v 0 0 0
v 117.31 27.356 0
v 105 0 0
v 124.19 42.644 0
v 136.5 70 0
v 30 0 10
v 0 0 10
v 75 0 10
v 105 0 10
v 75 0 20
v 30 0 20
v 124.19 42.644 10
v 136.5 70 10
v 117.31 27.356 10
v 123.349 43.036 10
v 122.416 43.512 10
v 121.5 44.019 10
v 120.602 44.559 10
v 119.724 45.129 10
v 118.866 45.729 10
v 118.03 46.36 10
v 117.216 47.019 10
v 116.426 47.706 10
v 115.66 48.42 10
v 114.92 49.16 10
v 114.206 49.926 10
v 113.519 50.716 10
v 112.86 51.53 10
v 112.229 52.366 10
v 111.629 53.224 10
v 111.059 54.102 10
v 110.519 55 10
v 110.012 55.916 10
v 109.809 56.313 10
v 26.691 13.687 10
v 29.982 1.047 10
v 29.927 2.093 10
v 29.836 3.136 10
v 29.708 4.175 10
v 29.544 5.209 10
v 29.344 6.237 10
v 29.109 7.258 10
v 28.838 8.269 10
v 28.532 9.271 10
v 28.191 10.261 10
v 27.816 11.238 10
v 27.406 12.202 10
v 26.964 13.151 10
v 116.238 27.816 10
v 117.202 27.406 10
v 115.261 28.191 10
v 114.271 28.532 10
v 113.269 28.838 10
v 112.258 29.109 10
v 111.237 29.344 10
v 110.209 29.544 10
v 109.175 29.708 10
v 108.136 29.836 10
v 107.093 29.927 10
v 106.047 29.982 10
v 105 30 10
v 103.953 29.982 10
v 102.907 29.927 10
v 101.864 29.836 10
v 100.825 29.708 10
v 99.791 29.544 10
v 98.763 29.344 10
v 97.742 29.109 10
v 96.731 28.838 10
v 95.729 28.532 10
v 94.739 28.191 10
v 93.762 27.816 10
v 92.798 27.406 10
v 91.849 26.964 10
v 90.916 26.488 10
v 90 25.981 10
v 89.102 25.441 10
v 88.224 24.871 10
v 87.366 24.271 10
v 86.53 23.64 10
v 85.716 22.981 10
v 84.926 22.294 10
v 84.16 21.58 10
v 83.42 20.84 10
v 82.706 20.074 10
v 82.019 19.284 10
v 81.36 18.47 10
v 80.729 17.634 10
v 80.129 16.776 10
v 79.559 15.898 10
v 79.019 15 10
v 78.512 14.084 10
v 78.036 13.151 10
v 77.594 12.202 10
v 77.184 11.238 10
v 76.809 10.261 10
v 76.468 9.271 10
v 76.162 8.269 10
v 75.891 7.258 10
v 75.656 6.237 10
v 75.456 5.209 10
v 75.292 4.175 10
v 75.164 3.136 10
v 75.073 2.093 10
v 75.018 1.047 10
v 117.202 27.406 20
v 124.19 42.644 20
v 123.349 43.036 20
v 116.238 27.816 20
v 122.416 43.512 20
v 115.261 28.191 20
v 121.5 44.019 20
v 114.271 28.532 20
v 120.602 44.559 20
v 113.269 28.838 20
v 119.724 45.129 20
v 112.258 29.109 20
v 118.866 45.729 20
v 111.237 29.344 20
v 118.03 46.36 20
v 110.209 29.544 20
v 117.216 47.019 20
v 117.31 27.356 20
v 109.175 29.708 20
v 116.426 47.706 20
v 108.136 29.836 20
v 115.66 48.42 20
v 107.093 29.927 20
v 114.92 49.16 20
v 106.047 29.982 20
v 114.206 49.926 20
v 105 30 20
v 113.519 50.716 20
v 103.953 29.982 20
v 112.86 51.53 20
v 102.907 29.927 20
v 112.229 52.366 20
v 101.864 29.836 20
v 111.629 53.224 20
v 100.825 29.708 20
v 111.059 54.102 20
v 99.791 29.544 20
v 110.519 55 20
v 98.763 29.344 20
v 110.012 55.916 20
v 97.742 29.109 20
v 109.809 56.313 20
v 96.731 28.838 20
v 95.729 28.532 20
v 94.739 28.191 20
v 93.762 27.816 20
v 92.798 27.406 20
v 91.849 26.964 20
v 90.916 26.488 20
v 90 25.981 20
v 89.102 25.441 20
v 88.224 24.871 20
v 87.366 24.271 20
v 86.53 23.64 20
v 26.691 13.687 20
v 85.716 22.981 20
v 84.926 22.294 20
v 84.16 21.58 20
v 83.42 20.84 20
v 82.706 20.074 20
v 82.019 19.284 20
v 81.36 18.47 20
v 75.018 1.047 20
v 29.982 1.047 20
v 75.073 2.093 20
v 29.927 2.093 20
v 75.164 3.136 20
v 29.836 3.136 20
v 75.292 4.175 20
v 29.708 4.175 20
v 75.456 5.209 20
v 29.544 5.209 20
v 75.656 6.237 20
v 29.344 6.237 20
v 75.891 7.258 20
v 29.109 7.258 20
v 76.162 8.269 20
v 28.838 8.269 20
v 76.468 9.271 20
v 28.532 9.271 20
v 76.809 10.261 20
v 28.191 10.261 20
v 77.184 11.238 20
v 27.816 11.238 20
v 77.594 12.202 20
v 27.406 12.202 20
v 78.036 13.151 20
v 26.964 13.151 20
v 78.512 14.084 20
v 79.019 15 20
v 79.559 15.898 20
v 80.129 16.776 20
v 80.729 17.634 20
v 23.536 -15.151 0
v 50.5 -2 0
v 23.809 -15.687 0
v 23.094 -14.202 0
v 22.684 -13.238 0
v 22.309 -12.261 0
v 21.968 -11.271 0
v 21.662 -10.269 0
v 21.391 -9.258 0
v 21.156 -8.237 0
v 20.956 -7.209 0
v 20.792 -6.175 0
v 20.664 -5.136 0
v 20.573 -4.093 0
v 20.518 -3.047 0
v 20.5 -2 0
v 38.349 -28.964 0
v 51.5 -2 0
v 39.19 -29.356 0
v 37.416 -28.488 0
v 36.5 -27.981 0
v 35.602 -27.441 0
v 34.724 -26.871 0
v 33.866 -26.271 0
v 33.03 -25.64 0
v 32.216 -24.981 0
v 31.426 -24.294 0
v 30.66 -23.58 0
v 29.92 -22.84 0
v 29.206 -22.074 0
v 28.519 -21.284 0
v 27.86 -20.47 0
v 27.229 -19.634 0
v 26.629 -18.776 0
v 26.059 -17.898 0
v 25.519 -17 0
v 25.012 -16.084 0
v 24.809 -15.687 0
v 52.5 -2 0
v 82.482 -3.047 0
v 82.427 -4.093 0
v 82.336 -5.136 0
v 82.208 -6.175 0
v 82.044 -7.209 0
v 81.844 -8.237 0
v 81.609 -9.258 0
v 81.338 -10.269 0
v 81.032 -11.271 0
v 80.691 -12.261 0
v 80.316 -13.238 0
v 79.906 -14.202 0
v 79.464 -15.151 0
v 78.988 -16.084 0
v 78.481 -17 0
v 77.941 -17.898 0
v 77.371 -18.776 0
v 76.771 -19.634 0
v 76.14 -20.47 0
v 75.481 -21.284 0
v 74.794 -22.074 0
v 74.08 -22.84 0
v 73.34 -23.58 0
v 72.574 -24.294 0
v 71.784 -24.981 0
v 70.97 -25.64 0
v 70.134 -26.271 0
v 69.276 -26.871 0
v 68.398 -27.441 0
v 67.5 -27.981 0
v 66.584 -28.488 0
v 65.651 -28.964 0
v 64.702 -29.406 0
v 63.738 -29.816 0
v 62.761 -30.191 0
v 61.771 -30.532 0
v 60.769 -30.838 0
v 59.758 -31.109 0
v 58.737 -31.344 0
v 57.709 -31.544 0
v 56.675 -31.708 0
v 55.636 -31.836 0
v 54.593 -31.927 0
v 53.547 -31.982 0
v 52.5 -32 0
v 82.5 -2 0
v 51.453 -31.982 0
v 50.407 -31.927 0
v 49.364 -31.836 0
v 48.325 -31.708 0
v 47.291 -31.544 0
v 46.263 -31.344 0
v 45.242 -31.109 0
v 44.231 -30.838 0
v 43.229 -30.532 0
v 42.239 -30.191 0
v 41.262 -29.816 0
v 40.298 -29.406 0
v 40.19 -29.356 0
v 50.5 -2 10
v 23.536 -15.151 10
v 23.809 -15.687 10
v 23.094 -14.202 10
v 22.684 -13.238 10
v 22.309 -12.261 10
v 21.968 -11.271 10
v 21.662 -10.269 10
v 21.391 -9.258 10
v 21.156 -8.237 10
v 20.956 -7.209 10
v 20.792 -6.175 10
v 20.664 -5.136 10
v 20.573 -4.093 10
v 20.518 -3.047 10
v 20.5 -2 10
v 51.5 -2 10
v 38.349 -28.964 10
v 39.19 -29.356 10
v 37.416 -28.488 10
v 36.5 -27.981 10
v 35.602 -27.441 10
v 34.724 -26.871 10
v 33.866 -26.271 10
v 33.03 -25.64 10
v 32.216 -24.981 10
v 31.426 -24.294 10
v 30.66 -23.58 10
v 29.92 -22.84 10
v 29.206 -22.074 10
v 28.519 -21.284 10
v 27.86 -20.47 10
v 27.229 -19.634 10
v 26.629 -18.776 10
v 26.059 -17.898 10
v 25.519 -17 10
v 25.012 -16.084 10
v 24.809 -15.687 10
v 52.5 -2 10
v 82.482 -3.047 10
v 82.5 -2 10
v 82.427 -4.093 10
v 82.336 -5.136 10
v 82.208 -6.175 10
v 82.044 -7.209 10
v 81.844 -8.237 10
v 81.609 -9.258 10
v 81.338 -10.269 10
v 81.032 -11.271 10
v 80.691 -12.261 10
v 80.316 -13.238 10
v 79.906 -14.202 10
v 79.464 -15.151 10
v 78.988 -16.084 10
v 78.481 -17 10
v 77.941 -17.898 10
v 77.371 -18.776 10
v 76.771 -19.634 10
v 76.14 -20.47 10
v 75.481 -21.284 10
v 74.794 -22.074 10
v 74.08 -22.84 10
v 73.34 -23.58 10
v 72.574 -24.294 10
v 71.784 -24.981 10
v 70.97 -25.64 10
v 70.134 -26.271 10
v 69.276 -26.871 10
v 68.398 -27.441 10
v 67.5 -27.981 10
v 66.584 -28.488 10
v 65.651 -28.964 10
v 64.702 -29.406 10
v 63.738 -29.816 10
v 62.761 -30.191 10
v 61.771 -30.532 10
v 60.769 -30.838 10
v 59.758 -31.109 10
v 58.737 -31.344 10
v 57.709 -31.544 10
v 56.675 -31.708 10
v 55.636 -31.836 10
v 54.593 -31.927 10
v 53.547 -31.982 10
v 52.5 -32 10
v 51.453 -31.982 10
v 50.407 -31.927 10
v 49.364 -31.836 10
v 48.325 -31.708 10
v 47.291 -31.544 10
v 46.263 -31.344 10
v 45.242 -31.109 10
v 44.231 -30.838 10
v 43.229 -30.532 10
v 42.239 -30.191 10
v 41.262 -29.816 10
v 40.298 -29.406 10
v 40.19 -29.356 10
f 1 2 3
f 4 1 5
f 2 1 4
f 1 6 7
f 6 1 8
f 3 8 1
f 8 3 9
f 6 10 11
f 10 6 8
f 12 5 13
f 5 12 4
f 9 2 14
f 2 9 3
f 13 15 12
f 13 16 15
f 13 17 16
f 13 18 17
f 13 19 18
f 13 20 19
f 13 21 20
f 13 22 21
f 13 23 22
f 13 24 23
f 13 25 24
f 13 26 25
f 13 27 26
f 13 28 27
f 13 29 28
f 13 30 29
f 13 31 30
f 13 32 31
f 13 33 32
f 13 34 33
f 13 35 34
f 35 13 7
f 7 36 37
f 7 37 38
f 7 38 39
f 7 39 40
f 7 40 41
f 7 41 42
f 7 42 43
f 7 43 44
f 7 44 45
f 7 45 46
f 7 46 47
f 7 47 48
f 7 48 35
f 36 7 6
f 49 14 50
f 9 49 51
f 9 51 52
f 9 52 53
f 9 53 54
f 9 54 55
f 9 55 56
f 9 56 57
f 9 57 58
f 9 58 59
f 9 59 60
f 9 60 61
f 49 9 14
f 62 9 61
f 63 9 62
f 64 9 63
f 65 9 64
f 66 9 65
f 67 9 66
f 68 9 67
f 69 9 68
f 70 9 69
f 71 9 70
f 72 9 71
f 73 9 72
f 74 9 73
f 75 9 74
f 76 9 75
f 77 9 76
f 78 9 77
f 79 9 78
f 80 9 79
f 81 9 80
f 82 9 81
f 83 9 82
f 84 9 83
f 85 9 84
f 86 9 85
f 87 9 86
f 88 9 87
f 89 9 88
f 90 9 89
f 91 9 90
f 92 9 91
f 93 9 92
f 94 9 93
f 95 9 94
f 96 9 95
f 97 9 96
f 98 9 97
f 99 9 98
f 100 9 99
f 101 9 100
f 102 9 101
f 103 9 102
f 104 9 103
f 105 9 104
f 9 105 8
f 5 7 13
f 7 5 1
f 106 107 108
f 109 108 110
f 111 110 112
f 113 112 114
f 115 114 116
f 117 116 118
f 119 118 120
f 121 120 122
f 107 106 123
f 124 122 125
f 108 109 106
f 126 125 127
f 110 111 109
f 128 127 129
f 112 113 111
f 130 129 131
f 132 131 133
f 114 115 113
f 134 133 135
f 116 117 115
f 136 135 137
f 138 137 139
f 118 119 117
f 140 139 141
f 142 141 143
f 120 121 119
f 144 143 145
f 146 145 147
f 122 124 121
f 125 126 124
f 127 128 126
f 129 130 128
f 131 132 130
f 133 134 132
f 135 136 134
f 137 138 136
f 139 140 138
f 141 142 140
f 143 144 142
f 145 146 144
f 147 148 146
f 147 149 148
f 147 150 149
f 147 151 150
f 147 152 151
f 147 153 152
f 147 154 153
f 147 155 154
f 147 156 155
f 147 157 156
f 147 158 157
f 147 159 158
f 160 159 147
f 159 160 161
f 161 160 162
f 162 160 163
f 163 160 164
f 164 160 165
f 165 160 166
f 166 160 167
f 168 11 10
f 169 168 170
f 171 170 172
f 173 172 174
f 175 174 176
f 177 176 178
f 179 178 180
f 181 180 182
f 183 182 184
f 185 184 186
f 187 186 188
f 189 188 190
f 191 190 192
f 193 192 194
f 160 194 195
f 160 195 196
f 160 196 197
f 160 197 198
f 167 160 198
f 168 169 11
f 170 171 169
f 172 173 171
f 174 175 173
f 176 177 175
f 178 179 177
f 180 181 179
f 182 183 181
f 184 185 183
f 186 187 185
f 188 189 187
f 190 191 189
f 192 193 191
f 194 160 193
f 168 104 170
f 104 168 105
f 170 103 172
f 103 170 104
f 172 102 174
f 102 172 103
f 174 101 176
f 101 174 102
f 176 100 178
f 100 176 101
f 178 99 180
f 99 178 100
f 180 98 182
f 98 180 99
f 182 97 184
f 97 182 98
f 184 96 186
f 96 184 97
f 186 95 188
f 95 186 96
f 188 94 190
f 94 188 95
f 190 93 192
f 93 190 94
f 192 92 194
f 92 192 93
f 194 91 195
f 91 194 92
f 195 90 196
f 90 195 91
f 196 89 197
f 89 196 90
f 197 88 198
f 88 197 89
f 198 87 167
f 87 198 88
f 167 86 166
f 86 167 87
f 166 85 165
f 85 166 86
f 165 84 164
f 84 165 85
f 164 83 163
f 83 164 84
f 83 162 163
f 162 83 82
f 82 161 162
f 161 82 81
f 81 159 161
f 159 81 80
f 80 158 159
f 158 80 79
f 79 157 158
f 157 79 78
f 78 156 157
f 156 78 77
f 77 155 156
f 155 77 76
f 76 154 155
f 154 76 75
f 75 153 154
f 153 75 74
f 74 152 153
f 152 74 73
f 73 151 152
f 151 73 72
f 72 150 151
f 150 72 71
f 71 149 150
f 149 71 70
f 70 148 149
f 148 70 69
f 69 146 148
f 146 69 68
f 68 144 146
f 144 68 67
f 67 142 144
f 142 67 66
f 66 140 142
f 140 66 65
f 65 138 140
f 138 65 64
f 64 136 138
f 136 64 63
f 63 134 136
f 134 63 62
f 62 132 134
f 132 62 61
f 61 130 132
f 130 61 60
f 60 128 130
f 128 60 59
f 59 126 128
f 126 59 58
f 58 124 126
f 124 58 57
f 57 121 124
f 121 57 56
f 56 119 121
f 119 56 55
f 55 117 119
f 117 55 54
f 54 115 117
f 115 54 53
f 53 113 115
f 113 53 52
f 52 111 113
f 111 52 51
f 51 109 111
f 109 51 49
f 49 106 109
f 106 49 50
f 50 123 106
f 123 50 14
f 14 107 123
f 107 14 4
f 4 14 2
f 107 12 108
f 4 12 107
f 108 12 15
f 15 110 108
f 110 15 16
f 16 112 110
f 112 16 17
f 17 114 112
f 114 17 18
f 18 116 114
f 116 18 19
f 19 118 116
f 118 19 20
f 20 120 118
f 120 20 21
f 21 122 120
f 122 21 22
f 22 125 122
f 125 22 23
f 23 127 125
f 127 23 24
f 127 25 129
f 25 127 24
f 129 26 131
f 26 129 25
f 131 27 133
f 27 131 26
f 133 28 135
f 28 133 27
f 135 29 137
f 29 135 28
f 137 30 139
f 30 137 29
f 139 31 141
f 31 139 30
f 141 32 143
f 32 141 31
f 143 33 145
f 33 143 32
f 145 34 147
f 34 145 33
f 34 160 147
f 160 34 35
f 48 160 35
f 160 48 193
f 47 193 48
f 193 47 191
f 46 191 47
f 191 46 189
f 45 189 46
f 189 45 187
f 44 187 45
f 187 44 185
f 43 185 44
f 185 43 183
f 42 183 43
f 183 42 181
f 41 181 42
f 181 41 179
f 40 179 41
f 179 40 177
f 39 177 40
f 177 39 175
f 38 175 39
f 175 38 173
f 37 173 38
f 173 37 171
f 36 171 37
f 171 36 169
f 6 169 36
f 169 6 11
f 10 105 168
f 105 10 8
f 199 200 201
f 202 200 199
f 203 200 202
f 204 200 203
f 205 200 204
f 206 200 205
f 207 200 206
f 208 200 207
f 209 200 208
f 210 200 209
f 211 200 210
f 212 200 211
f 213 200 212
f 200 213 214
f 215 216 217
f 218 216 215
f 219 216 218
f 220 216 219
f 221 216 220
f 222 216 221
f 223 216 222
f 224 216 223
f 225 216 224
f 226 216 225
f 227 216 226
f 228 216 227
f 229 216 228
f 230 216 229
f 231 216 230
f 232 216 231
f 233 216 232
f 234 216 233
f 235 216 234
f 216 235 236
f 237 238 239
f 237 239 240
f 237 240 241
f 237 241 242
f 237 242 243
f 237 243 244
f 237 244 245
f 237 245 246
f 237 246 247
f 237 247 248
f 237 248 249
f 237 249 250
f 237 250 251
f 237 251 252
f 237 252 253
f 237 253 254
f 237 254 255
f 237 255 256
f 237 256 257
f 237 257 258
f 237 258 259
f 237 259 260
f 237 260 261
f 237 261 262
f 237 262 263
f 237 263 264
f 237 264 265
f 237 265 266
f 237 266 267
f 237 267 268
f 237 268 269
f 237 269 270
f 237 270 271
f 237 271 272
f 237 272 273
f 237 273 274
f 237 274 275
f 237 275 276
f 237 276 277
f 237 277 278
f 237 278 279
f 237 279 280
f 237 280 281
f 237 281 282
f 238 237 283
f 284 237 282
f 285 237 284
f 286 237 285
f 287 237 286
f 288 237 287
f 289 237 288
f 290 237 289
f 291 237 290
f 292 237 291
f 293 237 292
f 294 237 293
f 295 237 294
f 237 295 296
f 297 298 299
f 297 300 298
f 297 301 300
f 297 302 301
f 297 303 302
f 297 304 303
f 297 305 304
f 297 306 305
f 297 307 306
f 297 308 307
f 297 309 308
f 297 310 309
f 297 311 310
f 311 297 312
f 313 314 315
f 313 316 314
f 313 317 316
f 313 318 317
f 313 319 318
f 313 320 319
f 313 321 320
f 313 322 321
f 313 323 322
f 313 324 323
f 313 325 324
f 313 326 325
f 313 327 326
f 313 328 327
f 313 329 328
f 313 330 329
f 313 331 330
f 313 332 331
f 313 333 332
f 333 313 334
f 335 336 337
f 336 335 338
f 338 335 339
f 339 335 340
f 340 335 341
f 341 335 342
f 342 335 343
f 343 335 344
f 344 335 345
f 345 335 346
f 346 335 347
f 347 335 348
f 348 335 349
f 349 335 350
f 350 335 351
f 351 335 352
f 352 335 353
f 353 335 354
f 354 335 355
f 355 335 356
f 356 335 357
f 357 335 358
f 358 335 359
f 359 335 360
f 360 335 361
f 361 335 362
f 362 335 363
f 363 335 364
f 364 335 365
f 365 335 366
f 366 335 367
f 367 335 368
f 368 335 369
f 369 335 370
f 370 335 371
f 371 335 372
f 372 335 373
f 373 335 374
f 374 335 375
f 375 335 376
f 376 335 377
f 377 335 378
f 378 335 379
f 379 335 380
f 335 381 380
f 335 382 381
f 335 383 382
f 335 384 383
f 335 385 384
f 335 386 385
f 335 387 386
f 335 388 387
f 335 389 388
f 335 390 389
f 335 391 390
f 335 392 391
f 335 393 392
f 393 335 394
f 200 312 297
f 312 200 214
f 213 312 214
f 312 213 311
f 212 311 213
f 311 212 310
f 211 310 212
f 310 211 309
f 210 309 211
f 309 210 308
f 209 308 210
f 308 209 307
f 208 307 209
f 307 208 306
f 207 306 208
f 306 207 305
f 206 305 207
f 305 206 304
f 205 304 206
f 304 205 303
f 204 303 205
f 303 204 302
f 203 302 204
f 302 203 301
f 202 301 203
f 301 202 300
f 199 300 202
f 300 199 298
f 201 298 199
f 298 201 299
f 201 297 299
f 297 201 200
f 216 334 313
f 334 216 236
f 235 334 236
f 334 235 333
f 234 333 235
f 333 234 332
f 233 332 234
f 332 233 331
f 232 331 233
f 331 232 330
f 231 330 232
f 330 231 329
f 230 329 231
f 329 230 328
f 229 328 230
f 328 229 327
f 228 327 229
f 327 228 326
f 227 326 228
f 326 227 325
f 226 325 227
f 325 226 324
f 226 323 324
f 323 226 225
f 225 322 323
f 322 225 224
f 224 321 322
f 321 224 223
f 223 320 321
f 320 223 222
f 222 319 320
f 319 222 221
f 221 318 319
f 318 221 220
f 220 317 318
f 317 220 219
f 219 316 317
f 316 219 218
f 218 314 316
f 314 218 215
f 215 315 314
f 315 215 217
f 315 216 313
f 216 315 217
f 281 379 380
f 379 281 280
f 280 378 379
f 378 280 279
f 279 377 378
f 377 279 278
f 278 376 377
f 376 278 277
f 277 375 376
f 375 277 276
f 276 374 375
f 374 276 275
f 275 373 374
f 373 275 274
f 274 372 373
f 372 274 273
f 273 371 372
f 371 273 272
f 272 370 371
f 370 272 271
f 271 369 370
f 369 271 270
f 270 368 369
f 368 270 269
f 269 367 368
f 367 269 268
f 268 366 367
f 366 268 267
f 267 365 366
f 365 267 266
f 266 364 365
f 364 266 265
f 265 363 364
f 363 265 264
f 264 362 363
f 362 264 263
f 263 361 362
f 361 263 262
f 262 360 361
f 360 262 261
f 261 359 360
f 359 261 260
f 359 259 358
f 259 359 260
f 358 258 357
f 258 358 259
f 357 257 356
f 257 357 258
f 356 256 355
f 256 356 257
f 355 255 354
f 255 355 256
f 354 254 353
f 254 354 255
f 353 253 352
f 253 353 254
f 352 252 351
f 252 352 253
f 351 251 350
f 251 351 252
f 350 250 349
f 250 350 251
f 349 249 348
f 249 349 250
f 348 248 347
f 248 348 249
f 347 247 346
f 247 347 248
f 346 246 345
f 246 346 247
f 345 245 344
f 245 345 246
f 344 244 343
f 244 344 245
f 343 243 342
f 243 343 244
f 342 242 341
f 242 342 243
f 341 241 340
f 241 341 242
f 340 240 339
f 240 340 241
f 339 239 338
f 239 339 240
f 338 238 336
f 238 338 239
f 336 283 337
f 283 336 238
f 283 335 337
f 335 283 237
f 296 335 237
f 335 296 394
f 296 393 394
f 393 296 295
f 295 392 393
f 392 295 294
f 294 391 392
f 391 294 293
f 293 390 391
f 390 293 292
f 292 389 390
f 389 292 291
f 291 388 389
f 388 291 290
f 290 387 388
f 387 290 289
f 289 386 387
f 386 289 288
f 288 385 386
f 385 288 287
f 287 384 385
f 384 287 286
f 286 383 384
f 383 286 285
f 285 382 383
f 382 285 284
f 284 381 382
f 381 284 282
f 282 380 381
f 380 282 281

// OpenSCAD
// file TriangleAngles.scad
// Demonstrates that the angles of a triangle sum to 180 degrees
// (c) 2023 Rich Cameron, for the book Make:Trigonometry
// Licensed under a Creative Commons, Attribution,
// CC-BY 4.0 international license, per
// https://creativecommons.org/licenses/by/4.0/
// Attribute to Rich Cameron, at
// repository github.com/whosawhatsis/Trigonometry

base = 105;
height = 70;
thickness = 20;

top = base * 1.3;

r = 30;

$fs = .1;
$fa = 2;

corners = [[0, 0], [top, height], [base, 0]];// - [for(i = [0:2]) [top / 2, height / 2]];

linear_extrude(thickness / 2) polygon(corners);
	
linear_extrude(thickness) {
	difference() {
		polygon(corners);
		for(c = corners) translate(c) circle(r);
	}
	*for(i = [0:2]) translate([i - 1, (i - 1) ? -1 : 1, 0]) intersection() {
		polygon(corners);
		translate(corners[i]) circle(r);
	}
}

linear_extrude(thickness / 2) for(i = [0:2]) translate([base / 2 + i - 2, -2, 0]) rotate(180) intersection() {
	rotate(180 * i) translate(-corners[i]) polygon(corners);
	circle(r);

}
